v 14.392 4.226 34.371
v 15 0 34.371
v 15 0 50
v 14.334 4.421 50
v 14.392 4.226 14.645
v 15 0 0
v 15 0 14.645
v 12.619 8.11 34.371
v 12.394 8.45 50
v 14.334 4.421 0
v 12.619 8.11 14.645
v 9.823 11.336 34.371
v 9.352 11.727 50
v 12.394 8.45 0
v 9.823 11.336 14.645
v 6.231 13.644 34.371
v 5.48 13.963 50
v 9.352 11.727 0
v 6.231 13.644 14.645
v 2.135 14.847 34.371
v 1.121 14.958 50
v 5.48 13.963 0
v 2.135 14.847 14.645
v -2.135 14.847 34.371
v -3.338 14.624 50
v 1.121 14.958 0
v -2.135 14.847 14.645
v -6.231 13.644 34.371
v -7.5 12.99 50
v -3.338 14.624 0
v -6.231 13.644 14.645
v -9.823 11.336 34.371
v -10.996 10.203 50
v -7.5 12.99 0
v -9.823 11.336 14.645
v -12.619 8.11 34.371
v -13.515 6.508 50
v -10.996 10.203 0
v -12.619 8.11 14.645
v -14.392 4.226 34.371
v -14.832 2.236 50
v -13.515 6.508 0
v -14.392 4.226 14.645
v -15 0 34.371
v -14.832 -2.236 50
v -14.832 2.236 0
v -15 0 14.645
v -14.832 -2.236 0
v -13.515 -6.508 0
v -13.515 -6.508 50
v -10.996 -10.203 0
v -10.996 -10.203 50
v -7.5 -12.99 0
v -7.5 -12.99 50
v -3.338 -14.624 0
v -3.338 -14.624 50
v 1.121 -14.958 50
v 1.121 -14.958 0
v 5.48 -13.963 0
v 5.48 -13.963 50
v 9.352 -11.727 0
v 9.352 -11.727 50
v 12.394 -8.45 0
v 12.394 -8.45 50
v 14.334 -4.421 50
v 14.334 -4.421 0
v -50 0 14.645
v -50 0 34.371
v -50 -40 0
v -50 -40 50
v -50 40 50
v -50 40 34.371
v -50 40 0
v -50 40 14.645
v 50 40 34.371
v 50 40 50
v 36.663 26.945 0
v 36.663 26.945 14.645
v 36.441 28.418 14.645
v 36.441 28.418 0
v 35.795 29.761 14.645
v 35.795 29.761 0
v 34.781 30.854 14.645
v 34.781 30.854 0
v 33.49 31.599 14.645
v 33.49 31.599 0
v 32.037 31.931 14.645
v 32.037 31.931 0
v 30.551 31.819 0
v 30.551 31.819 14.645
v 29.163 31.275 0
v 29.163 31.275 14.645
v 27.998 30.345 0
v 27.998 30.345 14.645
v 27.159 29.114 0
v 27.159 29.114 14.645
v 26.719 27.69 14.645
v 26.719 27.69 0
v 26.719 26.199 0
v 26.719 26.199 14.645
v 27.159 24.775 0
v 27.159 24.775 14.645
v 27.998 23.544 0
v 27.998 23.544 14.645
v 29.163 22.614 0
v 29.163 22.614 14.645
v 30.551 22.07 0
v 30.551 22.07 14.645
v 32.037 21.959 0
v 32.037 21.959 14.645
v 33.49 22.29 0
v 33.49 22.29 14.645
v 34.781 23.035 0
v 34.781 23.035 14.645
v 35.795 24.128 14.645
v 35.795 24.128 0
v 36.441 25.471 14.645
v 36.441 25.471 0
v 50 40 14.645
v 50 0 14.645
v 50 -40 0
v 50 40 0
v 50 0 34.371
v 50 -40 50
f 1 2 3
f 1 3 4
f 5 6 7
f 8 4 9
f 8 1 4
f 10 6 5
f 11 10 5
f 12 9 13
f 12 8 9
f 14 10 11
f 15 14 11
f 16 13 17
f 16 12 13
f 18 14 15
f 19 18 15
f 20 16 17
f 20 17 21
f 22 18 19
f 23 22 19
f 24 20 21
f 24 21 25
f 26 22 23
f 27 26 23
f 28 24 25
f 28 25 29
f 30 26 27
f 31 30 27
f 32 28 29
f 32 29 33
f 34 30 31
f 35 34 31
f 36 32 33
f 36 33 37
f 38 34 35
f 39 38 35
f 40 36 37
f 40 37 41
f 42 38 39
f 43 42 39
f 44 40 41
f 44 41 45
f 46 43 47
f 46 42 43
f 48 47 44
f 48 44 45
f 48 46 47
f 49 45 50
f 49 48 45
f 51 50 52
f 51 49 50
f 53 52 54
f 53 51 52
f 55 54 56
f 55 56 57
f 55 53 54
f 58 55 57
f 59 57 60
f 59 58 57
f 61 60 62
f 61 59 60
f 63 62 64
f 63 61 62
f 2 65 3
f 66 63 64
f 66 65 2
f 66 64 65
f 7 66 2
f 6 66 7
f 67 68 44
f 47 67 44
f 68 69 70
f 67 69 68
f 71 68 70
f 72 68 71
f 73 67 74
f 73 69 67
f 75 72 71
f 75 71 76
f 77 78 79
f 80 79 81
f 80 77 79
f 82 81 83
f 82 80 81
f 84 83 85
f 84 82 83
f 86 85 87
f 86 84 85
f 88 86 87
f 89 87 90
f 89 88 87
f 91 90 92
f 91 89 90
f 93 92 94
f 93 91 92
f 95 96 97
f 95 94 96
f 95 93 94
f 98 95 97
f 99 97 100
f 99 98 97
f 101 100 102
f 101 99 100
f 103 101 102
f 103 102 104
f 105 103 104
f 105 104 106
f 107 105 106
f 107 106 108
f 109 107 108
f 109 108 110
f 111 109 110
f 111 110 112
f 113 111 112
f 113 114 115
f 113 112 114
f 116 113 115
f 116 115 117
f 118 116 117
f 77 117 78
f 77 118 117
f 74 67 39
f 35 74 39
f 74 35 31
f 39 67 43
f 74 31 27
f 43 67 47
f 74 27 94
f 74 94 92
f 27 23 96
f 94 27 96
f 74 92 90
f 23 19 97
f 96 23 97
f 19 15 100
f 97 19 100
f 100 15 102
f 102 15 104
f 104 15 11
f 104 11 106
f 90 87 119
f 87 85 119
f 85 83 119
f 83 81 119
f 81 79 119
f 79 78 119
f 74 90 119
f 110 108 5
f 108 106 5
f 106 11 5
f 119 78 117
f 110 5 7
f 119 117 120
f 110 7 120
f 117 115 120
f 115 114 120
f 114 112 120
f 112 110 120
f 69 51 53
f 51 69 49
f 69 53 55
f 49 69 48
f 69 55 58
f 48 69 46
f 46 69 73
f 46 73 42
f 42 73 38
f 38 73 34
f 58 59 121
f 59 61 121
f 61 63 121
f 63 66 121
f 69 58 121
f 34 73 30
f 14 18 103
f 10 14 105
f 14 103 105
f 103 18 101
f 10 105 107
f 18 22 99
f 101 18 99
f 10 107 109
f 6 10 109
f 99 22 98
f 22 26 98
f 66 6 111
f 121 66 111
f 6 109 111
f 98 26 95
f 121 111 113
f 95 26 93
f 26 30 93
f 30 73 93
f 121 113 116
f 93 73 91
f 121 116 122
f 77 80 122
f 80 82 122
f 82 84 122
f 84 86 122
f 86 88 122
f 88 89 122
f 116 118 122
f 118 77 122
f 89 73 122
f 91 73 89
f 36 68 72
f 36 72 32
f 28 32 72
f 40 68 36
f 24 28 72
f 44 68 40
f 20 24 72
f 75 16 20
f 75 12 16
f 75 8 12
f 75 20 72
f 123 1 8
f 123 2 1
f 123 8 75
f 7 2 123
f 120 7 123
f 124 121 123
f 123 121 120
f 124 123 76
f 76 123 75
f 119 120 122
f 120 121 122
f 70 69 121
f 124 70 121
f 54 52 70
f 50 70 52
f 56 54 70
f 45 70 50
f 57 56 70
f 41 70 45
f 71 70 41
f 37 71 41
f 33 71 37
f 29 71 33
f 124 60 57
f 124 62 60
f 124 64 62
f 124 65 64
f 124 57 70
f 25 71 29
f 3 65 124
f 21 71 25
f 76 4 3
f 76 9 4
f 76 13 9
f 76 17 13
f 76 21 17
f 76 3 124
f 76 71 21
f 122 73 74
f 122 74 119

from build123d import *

# Parameters (mm, degrees)
F0_W     = 100
F0_H     = 80
F0_R     = 15
F1_DEPTH = 50
F2_W     = 132.103257
F2_H     = 19.725826
F3_DEPTH = 50
F4_R     = 5
F5_DEPTH = 25


with BuildPart() as f1:
    # F0 (on Top) → F1 (new body)
    with BuildSketch(Plane.XY):
        Rectangle(F0_W, F0_H)
        Circle(F0_R, mode=Mode.SUBTRACT)
    extrude(amount=F1_DEPTH)

    # F2 (on Front) → F3 (cut)
    with BuildSketch(Plane.XZ):
        with Locations((2.241571, 24.507845)):
            Rectangle(F2_W, F2_H)
    extrude(amount=-F3_DEPTH, mode=Mode.SUBTRACT)

    # F4 (on Top) → F5 (cut)
    with BuildSketch(Plane.XY):
        with Locations((31.663418, 26.944561)):
            Circle(F4_R)
    extrude(amount=F5_DEPTH, mode=Mode.SUBTRACT)


solid = f1.part
